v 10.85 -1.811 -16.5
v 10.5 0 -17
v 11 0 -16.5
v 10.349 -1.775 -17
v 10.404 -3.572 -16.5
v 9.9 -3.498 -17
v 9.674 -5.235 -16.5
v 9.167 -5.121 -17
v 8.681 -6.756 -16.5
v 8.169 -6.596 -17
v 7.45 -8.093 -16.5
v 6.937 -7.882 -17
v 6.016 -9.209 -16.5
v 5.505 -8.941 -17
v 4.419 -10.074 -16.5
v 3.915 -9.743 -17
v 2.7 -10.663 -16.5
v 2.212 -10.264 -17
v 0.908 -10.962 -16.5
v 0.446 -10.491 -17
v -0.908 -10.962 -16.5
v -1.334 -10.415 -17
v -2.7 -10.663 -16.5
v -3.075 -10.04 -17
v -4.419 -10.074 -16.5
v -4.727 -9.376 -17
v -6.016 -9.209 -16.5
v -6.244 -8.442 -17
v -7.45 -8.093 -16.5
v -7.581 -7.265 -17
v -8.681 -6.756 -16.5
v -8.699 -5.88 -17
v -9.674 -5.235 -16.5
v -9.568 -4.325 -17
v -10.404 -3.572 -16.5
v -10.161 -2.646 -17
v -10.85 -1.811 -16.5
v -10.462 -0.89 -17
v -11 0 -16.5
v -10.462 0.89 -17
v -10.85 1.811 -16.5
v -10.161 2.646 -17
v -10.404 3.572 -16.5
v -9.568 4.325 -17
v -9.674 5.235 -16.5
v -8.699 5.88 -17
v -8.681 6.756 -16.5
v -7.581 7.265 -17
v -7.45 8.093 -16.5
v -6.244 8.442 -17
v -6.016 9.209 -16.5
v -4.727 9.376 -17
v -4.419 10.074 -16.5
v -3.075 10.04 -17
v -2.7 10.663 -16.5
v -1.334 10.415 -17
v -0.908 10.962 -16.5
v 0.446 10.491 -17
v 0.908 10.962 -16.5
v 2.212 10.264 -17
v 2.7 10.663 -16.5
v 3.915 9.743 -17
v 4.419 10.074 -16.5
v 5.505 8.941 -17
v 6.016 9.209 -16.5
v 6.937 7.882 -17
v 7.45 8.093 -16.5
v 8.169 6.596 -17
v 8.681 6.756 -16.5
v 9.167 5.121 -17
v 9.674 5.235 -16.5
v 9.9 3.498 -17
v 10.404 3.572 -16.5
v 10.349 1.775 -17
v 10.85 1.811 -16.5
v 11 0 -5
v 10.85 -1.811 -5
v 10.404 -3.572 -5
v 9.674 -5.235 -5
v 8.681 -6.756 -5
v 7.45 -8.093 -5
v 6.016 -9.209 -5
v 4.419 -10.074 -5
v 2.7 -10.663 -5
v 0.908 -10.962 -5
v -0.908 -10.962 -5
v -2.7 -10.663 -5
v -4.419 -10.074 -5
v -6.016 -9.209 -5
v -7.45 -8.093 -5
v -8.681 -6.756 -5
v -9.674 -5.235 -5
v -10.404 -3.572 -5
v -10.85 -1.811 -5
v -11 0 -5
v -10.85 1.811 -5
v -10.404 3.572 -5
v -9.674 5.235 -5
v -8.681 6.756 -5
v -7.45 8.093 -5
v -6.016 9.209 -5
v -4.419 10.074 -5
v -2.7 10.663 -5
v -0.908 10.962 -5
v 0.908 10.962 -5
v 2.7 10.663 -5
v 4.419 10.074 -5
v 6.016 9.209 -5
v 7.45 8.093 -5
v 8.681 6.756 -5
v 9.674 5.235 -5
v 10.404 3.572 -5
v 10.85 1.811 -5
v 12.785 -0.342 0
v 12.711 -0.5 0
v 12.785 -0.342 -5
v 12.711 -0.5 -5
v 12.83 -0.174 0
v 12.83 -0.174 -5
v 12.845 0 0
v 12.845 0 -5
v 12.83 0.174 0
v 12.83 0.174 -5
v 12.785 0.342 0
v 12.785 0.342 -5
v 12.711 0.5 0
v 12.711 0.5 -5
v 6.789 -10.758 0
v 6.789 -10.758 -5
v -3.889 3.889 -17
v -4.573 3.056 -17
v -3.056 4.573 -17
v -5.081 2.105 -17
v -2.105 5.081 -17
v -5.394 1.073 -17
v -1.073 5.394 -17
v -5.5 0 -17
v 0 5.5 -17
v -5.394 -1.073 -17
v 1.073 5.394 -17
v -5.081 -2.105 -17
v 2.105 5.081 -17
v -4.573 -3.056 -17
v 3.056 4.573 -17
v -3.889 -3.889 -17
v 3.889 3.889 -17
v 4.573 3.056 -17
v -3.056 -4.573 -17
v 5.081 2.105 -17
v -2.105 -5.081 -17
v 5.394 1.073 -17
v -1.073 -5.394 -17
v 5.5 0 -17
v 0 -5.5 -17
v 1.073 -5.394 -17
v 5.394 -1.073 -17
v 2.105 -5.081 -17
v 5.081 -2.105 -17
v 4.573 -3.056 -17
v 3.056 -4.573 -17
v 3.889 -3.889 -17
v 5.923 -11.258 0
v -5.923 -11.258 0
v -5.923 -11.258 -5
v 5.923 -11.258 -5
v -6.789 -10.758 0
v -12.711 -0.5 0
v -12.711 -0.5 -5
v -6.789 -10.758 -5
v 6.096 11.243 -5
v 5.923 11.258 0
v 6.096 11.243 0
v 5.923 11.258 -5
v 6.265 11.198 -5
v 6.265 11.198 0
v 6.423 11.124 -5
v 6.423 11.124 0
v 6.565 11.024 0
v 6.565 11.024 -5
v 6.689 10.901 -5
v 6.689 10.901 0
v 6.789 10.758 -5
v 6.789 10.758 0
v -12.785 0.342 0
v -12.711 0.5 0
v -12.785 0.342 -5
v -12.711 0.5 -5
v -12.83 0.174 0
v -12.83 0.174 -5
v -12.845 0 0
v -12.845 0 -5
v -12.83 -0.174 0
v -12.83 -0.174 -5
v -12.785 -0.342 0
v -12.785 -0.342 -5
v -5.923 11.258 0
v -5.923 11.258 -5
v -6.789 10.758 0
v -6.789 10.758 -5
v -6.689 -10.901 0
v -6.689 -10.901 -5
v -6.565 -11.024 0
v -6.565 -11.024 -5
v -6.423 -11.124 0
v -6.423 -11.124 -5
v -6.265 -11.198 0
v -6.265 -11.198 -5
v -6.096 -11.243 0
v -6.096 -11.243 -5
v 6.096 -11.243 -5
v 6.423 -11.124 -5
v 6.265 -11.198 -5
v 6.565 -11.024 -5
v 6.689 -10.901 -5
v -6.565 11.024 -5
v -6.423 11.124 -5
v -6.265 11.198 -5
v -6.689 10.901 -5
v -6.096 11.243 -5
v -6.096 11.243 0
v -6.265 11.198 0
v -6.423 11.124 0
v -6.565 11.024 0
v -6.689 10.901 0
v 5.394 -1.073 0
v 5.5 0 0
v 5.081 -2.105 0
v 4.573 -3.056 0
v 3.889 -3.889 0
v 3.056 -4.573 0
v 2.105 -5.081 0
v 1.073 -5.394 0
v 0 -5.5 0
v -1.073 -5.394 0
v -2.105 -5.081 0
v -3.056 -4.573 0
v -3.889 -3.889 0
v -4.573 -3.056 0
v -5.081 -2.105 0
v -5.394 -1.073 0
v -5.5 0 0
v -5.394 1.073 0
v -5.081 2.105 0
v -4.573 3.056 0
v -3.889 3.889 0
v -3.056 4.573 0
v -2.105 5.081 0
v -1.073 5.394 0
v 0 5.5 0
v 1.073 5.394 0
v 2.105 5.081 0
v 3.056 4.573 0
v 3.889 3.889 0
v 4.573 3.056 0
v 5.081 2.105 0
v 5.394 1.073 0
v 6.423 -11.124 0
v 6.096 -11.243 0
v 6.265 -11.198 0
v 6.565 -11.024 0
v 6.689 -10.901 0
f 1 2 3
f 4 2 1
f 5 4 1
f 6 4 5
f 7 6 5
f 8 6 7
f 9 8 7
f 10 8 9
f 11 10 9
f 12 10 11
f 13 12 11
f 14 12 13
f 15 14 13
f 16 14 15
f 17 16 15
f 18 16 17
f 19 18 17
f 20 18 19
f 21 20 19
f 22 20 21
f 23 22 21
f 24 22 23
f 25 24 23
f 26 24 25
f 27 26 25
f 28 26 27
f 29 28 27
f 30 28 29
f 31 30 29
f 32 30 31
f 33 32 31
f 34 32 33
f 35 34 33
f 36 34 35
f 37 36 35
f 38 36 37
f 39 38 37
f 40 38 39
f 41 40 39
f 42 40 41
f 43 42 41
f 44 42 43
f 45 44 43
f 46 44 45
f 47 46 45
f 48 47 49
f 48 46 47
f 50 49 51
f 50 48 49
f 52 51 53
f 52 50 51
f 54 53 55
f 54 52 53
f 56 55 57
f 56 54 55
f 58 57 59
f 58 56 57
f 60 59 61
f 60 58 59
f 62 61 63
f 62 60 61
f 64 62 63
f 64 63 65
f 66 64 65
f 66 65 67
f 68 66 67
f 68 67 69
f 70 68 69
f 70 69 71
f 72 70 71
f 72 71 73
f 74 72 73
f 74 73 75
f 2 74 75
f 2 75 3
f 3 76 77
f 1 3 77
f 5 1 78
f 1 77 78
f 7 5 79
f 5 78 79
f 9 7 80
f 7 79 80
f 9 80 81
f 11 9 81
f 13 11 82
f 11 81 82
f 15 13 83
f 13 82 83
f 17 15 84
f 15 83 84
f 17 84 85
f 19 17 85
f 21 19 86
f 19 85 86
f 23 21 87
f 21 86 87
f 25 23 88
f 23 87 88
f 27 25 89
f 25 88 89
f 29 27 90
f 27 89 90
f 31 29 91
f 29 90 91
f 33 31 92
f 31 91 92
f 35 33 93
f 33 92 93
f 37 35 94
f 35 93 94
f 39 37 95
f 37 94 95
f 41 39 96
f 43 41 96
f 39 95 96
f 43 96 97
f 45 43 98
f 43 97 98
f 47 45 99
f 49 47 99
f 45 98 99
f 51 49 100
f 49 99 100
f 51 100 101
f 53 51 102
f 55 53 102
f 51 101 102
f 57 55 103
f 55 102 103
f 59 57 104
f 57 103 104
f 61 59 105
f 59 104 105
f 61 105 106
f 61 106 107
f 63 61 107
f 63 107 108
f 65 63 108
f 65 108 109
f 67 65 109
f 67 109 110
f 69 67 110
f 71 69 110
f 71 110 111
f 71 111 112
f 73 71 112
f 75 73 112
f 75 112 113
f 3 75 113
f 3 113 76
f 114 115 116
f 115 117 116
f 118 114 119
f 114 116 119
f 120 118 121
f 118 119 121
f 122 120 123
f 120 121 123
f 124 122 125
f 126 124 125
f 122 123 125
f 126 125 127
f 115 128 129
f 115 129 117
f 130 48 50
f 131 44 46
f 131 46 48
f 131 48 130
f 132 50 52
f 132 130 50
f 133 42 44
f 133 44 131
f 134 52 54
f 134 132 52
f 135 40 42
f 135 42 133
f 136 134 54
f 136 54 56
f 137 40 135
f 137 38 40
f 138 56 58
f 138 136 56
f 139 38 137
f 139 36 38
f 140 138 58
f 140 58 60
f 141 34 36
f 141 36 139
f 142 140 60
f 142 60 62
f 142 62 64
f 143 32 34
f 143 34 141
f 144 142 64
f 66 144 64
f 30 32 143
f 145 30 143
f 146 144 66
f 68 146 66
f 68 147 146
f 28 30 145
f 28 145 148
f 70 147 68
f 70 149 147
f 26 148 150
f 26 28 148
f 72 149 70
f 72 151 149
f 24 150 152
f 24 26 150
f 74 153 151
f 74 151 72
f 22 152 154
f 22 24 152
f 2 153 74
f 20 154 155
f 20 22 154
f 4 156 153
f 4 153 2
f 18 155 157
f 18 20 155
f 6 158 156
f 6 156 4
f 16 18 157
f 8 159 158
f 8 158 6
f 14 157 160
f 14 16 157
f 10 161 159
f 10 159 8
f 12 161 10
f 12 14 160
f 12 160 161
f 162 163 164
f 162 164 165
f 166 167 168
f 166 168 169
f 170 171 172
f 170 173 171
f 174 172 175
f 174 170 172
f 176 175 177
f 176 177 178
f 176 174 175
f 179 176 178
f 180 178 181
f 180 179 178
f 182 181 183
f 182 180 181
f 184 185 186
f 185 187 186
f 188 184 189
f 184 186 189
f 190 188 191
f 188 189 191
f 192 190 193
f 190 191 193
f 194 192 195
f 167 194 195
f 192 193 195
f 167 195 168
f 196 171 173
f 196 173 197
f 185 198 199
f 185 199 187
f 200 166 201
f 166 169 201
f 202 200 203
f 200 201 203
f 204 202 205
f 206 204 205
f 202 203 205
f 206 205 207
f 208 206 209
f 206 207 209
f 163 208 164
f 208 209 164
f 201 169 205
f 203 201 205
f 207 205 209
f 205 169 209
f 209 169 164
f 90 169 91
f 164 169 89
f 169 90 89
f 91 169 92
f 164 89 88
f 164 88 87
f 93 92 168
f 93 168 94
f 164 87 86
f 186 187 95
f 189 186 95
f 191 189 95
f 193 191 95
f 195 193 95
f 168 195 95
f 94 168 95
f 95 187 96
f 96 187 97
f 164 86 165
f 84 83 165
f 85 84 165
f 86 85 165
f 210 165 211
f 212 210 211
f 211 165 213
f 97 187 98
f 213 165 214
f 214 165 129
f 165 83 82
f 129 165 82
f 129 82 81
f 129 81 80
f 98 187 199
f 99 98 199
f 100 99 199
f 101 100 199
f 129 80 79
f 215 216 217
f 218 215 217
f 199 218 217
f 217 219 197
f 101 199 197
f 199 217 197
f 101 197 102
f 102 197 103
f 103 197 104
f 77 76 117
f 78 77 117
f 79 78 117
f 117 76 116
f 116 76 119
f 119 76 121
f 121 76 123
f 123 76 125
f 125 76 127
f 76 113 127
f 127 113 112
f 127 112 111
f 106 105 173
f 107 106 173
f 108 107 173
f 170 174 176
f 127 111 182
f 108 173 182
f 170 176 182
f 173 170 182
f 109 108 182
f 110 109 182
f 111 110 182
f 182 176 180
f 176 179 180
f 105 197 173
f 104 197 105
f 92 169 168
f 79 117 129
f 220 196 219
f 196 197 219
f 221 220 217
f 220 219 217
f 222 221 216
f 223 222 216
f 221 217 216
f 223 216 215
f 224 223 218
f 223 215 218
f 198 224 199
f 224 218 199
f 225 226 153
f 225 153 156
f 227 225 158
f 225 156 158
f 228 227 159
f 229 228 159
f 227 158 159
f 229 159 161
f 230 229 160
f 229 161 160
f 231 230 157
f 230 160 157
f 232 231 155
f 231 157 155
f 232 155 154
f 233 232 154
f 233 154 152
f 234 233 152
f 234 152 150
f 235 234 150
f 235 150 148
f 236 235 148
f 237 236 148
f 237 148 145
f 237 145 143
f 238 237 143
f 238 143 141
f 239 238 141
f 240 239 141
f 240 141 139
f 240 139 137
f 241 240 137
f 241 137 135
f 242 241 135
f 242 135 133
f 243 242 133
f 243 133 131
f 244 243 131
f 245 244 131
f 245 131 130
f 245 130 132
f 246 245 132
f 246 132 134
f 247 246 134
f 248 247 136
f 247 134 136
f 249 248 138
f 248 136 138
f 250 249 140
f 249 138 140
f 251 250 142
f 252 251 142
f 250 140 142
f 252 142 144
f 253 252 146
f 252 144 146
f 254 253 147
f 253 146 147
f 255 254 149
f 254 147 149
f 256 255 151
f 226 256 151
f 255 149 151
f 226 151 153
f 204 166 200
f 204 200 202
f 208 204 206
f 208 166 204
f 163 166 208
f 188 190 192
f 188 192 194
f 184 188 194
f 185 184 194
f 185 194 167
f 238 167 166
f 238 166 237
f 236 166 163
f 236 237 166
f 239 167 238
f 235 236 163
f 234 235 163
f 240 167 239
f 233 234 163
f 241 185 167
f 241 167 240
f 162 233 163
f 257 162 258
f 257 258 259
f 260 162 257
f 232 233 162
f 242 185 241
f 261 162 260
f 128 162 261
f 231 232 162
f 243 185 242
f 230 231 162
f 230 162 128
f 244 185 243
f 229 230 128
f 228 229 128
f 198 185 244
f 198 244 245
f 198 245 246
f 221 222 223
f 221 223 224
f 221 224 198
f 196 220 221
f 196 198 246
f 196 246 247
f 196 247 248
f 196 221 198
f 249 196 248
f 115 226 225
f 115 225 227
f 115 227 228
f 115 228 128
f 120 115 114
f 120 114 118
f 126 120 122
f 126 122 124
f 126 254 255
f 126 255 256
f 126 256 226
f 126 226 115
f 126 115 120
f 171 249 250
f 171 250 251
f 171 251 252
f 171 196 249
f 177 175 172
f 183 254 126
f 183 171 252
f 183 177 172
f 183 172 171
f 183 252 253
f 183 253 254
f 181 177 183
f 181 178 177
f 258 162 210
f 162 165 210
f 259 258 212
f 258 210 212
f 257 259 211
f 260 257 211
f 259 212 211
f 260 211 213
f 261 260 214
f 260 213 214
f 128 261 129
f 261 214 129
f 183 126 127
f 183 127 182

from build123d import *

# Parameters (mm, degrees)
F1_DEPTH = 5
F2_R     = 1
F4_R     = 11
F5_DEPTH = 12
F6_SIZE  = 0.5
F7_R     = 5.5
F8_DEPTH = 17.001


with BuildPart() as f1:
    # F0 (on Top) → F1 (new body)
    with BuildSketch(Plane.XY):
        Polygon((6.5, 11.25833), (-6.5, 11.25833), (-13, 0), (-6.5, -11.25833), (6.5, -11.25833), (13, 0), align=None)
    extrude(amount=-F1_DEPTH)

    # F2
    f2_edges = [f1.edges().sort_by_distance(p)[0] for p in [
        (6.5, -11.25833, -2.5),
        (-6.5, -11.25833, -2.5),
        (-13, 0, -2.5),
        (13, 0, -2.5),
        (6.5, 11.25833, -2.5),
        (-6.5, 11.25833, -2.5),
    ]]
    fillet(f2_edges, radius=F2_R)

    # F4 (on offset) → F5 (join)
    with BuildSketch(Plane(origin=(0, 0, -5), x_dir=(1, 0, 0), z_dir=(0, 0, -1))):
        Circle(F4_R)
    extrude(amount=F5_DEPTH)

    # F6
    f6_edges = [f1.edges().sort_by_distance(p)[0] for p in [
        (-11, 0, -17),
    ]]
    chamfer(f6_edges, length=F6_SIZE)

    # F7 (on face) → F8 (cut, through all)
    with BuildSketch(Plane(origin=(0, 0, -17), x_dir=(1, 0, 0), z_dir=(0, 0, -1))):
        Circle(F7_R)
    extrude(amount=-F8_DEPTH, mode=Mode.SUBTRACT)


solid = f1.part
